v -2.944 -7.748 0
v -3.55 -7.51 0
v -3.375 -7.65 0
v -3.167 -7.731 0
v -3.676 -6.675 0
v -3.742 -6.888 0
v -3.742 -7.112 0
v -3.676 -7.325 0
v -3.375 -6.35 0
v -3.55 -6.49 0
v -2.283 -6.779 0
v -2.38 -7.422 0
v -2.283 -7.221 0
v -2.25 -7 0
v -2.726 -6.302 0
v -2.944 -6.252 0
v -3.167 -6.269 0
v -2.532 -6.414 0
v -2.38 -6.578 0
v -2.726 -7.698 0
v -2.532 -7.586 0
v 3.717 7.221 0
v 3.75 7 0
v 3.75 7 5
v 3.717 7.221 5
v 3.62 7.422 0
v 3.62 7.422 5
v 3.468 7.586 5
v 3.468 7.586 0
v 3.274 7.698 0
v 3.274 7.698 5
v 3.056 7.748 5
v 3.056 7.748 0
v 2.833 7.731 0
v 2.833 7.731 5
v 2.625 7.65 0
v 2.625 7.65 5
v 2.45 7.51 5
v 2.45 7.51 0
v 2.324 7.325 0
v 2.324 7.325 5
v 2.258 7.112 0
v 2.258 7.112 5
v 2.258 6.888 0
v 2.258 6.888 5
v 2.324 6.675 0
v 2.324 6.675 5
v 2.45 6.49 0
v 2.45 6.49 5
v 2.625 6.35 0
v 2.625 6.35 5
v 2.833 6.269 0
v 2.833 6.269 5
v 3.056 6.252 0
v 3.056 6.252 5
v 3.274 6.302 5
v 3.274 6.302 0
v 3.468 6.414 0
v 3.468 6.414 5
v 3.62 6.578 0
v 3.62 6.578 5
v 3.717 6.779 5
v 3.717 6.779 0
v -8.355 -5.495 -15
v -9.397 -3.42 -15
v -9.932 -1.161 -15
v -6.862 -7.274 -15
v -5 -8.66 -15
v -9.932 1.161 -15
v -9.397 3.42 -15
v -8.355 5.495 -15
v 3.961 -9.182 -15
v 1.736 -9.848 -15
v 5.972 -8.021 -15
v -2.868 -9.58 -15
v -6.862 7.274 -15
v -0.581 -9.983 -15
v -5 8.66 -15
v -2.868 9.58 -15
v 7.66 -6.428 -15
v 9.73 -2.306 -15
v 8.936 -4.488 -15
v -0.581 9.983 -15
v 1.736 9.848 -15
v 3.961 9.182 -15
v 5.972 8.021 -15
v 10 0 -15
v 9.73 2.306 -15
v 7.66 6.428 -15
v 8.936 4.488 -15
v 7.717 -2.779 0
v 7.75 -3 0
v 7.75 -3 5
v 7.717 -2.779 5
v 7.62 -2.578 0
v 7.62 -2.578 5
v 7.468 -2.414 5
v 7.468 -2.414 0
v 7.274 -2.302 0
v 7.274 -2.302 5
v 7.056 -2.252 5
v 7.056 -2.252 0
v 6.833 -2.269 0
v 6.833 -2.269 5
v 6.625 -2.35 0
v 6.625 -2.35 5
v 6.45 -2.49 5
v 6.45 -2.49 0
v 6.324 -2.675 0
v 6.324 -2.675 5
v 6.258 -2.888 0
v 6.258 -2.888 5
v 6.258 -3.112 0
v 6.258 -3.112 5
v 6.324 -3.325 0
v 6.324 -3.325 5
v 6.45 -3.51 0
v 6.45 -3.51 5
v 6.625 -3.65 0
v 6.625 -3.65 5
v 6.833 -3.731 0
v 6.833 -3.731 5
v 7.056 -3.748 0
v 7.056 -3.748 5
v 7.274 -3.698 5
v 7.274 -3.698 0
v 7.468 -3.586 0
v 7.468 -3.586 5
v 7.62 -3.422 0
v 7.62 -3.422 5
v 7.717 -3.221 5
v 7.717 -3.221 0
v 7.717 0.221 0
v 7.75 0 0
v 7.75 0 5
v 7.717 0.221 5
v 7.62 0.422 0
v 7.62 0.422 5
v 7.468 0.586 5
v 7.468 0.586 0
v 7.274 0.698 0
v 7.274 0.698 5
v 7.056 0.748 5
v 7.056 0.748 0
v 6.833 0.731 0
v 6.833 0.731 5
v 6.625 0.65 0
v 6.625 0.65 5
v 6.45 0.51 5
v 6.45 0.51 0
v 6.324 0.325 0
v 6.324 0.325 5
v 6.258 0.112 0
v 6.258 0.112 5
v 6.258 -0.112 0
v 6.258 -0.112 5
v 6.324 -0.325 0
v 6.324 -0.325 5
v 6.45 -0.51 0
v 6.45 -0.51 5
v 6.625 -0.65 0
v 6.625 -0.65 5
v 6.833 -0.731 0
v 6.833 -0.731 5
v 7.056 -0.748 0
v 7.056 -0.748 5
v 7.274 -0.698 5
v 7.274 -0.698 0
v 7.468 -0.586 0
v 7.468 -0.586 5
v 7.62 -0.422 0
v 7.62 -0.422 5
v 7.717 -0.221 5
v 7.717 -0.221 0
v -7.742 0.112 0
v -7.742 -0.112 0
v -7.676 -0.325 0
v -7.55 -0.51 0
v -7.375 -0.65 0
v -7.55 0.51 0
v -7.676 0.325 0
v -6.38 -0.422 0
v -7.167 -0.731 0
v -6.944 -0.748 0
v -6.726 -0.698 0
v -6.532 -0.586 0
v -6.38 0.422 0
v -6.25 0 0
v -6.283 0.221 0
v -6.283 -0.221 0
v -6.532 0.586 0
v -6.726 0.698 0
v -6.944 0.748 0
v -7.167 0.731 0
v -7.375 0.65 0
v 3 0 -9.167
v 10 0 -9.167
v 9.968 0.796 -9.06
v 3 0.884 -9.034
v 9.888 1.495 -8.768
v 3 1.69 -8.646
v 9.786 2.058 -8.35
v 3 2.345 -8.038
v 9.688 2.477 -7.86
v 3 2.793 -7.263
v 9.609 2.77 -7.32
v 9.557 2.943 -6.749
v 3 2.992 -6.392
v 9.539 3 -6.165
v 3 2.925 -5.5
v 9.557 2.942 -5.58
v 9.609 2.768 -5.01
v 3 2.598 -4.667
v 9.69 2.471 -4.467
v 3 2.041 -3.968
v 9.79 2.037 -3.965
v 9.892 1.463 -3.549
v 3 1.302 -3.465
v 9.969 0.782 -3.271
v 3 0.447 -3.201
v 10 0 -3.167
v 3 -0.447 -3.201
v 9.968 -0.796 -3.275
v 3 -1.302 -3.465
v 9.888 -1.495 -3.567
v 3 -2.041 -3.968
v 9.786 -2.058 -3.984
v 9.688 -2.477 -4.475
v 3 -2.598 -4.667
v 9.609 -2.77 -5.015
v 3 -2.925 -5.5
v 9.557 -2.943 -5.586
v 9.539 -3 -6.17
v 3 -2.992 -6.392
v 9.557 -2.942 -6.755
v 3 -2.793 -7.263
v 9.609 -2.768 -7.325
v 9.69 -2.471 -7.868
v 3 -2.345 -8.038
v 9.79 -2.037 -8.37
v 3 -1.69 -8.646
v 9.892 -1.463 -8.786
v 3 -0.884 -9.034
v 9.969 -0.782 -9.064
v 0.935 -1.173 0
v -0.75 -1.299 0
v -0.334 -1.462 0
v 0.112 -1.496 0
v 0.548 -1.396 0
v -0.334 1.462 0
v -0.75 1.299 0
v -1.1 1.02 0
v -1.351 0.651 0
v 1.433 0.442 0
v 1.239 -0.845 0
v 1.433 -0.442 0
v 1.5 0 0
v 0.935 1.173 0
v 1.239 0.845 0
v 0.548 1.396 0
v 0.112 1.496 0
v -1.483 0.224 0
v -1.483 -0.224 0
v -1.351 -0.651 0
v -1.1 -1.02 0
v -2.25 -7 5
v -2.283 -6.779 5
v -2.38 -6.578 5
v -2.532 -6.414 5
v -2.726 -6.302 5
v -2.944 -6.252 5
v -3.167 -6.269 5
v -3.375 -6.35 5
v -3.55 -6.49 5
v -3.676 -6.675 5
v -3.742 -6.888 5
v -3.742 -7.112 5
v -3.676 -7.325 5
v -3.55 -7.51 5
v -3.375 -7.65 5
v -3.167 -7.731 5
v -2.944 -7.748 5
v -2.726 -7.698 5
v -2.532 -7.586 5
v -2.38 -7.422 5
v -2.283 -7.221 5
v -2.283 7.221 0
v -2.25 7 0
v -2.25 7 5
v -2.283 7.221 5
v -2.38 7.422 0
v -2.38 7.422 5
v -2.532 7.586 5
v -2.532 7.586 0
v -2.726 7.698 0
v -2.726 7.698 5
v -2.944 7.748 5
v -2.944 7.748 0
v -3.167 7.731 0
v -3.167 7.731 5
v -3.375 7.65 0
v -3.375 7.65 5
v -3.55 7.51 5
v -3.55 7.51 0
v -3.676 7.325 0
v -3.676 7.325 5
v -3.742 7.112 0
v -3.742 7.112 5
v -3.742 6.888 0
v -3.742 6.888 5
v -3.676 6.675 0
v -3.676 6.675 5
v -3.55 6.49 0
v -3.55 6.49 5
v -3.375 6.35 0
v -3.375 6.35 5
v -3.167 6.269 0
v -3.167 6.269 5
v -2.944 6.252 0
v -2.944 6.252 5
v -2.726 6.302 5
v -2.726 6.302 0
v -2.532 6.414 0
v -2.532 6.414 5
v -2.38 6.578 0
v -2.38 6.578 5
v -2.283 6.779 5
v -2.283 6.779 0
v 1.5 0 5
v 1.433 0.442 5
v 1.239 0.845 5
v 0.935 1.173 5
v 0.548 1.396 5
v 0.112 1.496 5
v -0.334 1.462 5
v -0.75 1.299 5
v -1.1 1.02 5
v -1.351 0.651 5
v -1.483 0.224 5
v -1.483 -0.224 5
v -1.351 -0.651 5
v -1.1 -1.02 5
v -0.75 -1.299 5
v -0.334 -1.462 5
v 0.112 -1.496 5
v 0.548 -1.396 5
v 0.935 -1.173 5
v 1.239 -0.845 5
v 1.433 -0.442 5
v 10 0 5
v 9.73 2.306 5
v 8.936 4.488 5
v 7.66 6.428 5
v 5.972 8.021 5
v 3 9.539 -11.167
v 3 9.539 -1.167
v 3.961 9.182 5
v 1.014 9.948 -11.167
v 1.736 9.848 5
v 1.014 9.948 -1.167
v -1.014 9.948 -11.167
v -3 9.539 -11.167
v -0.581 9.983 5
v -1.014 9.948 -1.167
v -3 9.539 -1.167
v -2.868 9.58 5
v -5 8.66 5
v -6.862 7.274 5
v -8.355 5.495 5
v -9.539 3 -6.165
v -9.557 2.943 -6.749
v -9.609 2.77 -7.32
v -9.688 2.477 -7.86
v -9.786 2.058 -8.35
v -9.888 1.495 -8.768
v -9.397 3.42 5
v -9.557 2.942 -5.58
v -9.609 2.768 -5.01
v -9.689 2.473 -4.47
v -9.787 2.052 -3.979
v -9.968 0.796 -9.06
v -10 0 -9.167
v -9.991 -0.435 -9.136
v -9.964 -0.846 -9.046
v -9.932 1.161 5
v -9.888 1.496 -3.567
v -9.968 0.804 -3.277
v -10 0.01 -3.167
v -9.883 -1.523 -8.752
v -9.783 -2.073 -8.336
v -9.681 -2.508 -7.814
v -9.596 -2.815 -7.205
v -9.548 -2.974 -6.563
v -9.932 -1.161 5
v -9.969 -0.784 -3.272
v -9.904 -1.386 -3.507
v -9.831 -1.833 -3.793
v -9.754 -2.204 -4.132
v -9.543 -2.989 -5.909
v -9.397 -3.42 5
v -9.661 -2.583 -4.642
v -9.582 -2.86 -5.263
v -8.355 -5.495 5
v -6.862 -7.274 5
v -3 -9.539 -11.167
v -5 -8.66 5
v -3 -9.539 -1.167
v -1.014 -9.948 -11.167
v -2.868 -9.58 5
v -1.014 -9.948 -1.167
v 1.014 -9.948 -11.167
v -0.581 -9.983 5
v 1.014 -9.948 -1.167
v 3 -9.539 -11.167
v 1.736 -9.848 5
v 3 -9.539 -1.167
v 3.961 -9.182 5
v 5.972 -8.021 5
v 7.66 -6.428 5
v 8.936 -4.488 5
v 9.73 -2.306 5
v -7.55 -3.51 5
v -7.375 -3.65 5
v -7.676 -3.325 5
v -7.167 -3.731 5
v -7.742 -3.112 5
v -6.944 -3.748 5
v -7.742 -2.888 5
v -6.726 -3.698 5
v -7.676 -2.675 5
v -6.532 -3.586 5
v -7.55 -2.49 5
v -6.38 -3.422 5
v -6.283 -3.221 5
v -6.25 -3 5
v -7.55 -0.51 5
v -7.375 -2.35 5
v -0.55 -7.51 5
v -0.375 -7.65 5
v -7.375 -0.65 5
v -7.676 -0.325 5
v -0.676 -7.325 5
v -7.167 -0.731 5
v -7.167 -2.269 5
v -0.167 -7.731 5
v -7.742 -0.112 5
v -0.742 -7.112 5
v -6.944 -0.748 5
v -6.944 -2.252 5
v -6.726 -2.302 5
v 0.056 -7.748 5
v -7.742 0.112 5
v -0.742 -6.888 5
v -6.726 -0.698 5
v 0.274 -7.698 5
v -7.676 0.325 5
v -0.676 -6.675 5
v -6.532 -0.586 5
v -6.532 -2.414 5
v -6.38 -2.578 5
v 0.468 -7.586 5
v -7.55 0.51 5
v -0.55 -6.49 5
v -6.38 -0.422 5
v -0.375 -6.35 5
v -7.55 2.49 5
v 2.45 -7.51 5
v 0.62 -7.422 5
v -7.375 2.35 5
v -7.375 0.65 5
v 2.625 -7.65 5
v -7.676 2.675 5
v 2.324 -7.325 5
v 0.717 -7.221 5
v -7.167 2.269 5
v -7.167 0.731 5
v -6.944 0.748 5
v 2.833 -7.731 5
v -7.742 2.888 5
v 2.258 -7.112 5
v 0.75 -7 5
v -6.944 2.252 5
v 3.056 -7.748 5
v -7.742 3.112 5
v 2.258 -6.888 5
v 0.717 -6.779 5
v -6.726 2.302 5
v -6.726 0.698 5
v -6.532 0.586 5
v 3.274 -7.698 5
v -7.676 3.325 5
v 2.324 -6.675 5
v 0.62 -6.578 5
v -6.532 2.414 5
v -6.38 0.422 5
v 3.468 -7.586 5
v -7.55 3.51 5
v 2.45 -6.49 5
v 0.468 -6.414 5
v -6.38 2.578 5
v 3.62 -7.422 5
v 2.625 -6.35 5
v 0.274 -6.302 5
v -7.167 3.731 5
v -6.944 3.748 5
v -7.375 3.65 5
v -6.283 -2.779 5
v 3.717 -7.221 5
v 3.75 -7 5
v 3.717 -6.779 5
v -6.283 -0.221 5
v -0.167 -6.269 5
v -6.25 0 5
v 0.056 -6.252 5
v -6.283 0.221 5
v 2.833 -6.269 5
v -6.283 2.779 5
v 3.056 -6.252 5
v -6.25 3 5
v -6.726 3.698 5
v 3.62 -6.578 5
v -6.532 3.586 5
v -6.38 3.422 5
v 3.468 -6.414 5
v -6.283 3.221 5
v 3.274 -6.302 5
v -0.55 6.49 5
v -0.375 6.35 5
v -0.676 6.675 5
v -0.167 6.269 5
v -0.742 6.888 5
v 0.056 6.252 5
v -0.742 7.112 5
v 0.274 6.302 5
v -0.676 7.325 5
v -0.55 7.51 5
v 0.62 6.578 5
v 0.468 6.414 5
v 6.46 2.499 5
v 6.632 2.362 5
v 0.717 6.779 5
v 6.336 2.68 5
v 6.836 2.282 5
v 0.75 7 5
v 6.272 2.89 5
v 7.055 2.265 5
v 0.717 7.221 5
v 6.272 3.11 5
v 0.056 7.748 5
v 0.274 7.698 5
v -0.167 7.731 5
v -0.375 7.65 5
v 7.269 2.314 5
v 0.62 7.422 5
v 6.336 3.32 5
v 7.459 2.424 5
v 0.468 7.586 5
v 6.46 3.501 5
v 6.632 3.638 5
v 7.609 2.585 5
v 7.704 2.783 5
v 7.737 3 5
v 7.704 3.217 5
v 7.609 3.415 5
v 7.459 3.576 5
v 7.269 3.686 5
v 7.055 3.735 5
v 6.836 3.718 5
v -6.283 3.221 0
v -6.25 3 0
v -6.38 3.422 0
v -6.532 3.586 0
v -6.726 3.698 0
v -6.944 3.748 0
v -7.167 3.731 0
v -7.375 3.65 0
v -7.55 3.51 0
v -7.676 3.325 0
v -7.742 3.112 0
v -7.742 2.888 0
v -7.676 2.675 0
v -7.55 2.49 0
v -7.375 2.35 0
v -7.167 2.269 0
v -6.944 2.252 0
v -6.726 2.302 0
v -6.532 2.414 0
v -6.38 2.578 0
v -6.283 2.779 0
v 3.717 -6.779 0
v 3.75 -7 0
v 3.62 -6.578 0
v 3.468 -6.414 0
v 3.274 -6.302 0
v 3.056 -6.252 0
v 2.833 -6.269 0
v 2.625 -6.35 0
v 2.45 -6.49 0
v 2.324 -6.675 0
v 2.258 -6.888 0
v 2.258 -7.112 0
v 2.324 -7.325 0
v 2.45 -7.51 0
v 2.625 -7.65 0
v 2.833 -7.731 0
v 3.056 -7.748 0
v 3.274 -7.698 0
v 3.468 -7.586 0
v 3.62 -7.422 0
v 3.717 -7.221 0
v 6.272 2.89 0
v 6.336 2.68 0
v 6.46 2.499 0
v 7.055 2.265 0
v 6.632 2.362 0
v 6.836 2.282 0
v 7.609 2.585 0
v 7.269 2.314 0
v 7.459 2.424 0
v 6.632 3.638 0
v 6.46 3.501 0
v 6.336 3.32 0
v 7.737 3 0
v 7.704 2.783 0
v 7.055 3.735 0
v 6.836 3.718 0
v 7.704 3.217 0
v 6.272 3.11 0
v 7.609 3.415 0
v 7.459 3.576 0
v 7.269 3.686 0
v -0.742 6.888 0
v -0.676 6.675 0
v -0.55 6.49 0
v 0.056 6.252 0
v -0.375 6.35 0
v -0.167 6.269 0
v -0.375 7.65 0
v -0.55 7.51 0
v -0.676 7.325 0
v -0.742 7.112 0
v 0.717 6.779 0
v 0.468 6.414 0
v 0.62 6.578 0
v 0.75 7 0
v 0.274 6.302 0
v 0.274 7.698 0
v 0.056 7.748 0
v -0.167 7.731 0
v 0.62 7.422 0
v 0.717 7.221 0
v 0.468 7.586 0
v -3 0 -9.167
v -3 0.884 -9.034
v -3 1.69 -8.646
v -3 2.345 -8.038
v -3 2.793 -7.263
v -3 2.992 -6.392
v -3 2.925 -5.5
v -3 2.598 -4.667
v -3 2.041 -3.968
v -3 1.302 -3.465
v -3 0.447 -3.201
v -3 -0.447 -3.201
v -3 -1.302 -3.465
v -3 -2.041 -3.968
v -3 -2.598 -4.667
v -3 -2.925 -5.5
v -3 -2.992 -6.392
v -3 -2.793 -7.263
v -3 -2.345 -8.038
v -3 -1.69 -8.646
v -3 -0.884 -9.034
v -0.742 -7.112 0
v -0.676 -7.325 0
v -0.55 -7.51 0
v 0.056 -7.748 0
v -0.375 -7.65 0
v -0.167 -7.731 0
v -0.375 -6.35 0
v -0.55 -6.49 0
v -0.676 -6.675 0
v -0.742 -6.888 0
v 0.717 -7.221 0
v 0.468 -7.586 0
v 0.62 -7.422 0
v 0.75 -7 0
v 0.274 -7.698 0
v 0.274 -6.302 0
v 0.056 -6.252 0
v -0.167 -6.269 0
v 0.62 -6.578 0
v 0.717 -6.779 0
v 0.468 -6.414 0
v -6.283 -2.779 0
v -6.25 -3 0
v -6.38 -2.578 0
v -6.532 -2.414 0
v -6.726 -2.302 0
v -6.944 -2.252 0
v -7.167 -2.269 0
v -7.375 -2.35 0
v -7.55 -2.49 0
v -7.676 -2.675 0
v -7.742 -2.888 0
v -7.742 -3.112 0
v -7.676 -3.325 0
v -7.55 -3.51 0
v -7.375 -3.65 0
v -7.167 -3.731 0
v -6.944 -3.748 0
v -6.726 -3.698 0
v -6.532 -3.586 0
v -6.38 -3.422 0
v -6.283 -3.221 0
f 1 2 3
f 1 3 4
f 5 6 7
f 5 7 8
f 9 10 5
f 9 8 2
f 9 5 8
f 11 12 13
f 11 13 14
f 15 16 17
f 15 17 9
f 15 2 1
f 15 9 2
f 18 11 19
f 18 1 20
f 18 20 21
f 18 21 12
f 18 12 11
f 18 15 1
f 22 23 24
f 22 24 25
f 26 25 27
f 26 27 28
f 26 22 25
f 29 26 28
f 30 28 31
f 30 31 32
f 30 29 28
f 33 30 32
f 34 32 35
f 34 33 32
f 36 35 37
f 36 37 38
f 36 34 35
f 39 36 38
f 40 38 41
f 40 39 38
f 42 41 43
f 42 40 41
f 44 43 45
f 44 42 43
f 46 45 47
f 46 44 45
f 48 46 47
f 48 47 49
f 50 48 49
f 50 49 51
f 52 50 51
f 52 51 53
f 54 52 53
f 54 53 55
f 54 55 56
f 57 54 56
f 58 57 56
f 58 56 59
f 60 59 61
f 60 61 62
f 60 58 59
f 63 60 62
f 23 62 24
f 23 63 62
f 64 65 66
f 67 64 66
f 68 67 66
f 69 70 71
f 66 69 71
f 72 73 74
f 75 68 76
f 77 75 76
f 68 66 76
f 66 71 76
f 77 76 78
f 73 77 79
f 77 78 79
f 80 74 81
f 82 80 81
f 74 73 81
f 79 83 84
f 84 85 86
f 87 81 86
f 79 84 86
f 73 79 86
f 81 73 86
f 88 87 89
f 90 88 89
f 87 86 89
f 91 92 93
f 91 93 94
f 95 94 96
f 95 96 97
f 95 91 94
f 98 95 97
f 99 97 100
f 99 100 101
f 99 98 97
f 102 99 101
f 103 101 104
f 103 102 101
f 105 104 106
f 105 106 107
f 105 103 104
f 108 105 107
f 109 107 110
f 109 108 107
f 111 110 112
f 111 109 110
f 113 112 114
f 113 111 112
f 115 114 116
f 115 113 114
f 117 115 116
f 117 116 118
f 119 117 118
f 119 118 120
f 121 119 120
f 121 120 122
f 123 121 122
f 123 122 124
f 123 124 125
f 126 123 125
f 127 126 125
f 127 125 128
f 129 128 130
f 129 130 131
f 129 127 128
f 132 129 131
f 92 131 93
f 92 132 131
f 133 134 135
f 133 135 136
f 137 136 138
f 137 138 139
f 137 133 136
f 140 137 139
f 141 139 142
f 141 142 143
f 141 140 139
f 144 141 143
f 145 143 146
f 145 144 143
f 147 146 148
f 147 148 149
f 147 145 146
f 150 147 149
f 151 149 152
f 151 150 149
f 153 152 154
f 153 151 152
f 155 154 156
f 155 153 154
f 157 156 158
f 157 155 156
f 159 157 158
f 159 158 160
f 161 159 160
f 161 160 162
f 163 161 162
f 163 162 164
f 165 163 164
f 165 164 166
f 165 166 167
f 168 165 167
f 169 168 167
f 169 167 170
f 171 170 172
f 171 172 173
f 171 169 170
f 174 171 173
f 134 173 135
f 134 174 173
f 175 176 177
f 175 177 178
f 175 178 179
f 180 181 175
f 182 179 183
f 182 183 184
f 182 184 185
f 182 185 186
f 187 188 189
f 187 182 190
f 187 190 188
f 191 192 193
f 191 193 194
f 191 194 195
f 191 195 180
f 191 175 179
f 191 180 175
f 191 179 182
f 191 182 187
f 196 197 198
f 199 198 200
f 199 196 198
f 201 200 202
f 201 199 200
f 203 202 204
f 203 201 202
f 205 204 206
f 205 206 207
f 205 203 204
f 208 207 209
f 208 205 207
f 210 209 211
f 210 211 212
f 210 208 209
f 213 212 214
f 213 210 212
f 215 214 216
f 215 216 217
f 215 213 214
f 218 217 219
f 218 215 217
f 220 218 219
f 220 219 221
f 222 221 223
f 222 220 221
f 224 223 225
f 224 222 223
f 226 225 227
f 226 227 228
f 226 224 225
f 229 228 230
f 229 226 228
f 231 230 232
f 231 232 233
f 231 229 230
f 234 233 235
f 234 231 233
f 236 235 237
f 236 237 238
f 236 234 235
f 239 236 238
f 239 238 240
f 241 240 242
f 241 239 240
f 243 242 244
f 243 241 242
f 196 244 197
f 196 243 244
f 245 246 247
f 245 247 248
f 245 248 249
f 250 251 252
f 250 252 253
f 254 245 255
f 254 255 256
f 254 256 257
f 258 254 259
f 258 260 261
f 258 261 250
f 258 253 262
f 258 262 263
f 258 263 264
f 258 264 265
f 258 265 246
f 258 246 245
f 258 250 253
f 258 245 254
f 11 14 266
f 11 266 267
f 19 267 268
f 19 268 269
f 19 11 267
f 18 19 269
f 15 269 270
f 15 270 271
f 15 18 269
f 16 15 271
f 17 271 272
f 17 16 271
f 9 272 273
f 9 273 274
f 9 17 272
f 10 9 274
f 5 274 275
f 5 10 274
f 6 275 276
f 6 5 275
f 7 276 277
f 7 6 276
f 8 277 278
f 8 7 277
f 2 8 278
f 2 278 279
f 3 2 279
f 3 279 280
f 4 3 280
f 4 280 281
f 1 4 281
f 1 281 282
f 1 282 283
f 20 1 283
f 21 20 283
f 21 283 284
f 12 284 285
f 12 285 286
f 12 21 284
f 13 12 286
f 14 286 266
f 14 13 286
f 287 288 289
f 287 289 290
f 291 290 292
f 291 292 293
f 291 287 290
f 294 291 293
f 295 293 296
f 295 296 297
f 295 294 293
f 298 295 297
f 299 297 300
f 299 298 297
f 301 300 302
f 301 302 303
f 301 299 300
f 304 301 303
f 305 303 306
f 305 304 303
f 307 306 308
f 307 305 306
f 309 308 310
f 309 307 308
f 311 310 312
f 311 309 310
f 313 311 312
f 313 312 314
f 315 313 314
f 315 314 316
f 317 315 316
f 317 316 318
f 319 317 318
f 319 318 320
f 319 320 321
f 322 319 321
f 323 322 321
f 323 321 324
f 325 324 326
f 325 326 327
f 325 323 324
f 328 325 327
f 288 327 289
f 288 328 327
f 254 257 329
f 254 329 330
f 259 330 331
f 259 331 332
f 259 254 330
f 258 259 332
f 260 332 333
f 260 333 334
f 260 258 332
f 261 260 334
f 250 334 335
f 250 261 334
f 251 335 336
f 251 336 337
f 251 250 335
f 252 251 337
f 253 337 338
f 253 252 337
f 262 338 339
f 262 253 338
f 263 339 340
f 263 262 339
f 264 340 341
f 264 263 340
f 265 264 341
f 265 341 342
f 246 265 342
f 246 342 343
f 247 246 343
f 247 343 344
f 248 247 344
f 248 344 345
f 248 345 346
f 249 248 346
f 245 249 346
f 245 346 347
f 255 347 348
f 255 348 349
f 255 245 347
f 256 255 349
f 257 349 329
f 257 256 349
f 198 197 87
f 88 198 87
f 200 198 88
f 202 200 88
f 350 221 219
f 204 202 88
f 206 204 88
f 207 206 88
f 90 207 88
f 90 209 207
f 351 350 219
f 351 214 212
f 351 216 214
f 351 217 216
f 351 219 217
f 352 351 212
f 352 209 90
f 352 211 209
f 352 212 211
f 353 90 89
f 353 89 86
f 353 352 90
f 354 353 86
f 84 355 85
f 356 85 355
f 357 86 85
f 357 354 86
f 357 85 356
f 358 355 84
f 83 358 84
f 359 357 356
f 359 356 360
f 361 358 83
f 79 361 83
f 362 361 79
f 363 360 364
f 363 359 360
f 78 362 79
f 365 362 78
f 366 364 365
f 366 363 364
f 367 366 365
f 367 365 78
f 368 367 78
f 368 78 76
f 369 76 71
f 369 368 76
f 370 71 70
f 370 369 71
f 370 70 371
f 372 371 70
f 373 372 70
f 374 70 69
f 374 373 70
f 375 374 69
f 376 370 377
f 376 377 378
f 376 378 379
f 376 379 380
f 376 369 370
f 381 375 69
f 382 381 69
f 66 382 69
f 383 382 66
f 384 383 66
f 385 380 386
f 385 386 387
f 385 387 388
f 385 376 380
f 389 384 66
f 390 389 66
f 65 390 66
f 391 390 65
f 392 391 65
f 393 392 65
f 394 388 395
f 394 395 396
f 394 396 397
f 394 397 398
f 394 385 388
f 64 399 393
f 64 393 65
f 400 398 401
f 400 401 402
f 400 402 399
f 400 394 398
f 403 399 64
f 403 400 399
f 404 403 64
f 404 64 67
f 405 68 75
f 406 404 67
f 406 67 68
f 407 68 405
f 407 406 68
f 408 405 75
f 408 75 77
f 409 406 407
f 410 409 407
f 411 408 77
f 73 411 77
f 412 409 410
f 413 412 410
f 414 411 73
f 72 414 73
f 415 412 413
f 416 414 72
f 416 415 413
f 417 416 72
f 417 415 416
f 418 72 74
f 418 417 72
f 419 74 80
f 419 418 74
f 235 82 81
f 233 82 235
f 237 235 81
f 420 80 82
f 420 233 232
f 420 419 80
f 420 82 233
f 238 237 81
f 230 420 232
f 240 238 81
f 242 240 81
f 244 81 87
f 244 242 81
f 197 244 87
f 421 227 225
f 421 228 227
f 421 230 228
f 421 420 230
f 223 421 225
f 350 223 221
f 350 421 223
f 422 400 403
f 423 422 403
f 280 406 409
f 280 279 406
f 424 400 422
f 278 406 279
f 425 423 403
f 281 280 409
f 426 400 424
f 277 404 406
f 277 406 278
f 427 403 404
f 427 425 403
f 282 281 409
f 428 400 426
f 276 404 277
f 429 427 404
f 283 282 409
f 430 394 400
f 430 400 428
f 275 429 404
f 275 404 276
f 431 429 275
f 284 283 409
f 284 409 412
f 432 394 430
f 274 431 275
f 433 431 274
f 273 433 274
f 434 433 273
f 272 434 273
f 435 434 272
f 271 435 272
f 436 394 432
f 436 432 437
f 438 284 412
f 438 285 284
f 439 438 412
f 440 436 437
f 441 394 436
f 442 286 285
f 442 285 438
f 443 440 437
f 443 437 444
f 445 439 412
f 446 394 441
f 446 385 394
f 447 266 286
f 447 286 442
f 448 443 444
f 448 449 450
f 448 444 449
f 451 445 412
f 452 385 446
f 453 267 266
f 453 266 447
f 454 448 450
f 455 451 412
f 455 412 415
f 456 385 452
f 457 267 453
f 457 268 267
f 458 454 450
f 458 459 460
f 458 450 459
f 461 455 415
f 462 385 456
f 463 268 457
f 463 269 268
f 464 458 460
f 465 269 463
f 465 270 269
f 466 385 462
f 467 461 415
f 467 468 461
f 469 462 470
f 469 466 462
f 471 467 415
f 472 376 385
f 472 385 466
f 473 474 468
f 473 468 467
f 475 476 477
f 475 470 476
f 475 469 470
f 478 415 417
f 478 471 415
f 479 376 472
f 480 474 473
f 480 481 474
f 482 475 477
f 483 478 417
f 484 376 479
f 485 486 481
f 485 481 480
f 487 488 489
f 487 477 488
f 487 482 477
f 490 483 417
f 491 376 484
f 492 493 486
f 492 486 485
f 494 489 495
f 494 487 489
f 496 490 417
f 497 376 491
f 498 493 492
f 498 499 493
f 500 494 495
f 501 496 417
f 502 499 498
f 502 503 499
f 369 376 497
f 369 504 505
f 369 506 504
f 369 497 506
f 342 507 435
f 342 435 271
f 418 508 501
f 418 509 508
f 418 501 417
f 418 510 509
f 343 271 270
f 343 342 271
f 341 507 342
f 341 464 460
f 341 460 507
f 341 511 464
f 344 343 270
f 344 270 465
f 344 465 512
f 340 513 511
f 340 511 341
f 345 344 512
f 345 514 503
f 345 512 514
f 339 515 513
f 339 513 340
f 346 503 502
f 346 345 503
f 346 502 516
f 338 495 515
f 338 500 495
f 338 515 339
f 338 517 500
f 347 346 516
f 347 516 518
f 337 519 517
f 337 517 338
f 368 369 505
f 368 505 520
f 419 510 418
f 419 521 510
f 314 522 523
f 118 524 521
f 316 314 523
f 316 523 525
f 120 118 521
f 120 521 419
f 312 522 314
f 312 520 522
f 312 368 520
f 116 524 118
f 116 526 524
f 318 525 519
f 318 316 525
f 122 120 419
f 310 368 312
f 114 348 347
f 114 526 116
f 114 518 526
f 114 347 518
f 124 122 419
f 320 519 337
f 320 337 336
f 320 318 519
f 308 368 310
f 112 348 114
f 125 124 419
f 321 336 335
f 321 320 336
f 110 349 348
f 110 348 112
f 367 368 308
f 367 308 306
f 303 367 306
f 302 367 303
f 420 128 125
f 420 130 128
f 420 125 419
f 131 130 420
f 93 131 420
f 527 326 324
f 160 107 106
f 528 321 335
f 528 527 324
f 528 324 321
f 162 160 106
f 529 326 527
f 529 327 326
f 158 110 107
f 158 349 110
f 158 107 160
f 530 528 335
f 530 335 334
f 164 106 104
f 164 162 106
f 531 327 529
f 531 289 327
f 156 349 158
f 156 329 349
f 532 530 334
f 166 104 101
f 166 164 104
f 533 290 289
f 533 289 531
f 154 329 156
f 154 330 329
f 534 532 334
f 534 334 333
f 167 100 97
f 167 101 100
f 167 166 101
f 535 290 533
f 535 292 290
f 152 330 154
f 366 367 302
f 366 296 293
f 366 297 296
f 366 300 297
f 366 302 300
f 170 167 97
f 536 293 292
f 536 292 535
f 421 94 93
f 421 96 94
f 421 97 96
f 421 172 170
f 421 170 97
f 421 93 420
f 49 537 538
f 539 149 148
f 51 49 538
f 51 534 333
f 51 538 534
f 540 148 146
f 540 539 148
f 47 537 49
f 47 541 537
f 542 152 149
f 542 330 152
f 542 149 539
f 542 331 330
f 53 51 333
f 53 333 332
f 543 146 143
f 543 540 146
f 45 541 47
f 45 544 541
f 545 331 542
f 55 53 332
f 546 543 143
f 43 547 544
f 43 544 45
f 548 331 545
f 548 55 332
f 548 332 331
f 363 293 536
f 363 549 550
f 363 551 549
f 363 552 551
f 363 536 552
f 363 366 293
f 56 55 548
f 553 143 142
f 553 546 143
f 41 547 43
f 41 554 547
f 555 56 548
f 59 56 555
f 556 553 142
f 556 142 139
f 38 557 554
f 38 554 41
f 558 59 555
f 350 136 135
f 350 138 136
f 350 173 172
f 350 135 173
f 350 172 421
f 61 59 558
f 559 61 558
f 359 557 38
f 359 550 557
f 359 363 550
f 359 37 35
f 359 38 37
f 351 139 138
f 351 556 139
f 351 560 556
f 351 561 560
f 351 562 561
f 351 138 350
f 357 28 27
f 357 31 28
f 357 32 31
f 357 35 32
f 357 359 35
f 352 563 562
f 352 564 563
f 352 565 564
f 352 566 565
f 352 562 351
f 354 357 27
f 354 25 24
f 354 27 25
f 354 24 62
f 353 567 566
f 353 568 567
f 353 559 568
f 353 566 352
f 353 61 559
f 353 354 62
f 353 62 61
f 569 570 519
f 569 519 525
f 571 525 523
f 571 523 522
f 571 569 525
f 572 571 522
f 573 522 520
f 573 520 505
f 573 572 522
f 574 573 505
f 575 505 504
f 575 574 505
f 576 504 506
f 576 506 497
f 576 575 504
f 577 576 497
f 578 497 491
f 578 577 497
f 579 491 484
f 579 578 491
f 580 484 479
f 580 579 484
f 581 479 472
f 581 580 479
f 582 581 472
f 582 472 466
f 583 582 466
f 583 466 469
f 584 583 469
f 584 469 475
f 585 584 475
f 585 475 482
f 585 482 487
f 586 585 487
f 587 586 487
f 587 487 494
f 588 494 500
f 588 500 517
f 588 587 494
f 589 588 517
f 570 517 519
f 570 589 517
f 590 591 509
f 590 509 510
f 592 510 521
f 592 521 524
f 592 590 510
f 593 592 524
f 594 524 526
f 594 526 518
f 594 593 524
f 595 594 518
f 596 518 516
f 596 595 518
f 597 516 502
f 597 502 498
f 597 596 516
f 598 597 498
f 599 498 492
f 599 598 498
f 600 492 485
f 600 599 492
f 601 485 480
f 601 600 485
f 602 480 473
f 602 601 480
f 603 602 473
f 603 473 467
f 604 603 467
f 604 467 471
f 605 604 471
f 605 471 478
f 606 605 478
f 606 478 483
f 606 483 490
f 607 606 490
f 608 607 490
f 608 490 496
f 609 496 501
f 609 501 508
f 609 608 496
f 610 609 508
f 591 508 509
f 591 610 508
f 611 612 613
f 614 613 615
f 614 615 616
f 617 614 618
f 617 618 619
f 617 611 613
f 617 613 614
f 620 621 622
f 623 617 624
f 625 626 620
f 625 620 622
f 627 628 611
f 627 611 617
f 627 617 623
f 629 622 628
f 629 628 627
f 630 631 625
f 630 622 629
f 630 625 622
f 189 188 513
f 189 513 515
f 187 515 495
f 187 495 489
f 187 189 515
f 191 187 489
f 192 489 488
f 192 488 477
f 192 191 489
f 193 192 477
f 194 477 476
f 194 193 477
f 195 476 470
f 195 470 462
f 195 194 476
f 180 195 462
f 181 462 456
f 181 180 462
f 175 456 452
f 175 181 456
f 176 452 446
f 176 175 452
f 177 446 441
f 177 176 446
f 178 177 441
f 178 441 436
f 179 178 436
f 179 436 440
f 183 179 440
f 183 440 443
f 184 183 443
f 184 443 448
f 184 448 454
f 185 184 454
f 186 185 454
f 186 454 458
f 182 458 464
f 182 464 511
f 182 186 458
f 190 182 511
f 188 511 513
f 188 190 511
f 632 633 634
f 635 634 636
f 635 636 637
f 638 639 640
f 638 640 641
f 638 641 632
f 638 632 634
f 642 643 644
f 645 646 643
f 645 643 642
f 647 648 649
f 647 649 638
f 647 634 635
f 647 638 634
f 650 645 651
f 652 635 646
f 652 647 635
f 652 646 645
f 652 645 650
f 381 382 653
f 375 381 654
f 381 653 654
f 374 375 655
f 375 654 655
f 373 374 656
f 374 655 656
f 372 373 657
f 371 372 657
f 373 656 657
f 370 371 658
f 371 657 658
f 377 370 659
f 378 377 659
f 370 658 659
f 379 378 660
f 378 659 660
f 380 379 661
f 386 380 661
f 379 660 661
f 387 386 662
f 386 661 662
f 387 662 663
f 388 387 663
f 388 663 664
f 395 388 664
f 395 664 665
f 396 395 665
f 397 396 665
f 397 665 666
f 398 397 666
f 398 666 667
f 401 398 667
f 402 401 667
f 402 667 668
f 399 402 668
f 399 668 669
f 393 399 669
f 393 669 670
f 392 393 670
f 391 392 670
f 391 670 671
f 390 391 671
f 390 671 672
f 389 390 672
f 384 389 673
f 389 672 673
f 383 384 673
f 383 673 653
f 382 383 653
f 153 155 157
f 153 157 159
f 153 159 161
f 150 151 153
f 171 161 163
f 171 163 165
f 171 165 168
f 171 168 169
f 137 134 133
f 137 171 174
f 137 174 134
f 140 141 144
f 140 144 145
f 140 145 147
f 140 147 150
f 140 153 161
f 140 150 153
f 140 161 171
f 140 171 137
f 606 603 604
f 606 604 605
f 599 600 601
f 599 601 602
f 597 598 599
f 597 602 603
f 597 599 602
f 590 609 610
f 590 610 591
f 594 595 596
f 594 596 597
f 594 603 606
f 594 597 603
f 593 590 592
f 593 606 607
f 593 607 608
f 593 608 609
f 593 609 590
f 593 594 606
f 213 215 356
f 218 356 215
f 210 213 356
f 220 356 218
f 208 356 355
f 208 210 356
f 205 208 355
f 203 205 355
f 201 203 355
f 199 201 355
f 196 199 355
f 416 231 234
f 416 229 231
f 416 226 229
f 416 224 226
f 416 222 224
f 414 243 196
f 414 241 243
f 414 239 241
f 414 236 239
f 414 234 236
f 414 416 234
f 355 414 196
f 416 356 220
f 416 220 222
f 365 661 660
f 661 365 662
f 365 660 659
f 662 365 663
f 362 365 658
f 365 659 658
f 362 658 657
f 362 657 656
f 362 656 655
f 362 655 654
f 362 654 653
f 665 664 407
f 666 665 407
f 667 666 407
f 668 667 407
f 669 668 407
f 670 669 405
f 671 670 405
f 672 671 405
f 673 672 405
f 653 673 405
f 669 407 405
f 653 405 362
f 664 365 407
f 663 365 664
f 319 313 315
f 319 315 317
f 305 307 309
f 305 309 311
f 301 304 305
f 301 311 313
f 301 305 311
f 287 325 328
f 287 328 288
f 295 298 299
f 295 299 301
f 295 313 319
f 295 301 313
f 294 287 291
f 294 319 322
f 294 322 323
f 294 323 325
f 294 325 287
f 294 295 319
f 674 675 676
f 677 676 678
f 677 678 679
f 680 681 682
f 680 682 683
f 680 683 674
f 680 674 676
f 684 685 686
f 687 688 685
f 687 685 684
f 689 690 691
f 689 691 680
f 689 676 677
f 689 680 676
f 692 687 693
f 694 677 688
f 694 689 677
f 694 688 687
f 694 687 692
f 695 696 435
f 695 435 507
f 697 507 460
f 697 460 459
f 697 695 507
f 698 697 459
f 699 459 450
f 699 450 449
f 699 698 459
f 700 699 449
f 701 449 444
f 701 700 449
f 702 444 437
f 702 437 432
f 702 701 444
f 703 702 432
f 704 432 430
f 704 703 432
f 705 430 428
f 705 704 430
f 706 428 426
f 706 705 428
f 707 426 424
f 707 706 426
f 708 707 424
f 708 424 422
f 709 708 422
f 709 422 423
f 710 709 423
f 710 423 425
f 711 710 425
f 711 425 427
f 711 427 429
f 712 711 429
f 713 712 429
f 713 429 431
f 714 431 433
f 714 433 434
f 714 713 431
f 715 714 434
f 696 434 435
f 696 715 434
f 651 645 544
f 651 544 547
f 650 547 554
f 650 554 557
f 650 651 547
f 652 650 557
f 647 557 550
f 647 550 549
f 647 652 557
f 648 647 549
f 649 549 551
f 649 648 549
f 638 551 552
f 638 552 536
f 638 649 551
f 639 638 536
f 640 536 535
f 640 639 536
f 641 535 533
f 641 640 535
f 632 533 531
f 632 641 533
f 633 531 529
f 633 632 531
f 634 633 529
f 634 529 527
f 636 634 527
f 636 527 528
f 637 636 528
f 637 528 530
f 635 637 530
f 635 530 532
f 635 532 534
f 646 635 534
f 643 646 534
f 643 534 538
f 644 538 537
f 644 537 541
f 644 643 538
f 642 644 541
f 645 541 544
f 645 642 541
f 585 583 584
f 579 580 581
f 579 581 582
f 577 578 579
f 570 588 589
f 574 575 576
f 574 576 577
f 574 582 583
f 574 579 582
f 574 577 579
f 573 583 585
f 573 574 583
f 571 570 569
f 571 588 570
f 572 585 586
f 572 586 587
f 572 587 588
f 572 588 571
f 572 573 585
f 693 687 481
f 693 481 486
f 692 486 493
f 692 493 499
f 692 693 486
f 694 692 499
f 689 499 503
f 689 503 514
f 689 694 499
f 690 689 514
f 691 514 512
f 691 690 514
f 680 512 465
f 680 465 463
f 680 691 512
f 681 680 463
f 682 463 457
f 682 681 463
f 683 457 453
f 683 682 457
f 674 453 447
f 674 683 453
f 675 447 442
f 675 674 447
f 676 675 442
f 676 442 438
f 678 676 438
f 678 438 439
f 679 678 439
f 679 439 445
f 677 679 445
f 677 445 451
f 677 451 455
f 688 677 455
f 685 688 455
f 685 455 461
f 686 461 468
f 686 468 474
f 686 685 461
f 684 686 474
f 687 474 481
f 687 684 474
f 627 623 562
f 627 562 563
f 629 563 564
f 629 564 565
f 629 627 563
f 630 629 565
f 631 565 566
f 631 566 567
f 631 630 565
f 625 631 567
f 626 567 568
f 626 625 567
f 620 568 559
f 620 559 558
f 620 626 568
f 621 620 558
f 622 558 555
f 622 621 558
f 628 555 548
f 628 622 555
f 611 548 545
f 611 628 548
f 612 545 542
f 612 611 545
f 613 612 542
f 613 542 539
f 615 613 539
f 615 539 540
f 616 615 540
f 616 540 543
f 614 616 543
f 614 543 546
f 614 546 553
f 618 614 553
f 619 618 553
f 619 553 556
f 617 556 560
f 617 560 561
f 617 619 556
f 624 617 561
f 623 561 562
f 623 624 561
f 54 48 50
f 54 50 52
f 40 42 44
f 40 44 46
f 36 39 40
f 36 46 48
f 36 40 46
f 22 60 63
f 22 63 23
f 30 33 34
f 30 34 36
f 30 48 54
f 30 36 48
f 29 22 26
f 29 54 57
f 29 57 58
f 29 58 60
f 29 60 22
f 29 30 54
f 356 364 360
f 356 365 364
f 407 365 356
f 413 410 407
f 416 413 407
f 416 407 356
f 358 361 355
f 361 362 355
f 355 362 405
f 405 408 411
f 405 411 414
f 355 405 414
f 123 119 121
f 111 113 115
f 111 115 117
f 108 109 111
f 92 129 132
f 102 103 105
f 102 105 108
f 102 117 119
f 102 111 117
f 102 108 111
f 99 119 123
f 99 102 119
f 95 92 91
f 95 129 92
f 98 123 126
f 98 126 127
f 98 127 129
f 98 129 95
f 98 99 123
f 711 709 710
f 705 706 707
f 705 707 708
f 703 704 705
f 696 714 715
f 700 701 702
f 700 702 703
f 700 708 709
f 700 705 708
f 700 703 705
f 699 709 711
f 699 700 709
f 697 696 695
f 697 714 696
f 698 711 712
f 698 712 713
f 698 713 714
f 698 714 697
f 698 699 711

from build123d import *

# Parameters (mm, degrees)
SKETCH2_R               = 10
SKETCH2_R_2             = 1.5
SKETCH2_R_3             = 0.736643129
SKETCH2_R_4             = 0.75
BOSS_EXTRUDE1_DEPTH     = 5
BOSS_EXTRUDE2_START     = -15
SKETCH3_R               = 10
BOSS_EXTRUDE2_DEPTH     = 15
CUT_EXTRUDE1_DEPTH      = 20
CUT_EXTRUDE1_DEPTH_BACK = 20
SKETCH4_W               = 6
SKETCH4_H               = 10
CUT_EXTRUDE2_DEPTH      = 20
CUT_EXTRUDE2_DEPTH_BACK = 20
SKETCH5_R               = 3


with BuildPart() as part:
    # Sketch2 → Boss-Extrude1 (new body)
    with BuildSketch(Plane.XY):
        Circle(SKETCH2_R)
        Circle(SKETCH2_R_2, mode=Mode.SUBTRACT)
        with Locations((7, 3)):
            Circle(SKETCH2_R_3, mode=Mode.SUBTRACT)
        with Locations((7, 0)):
            Circle(SKETCH2_R_4, mode=Mode.SUBTRACT)
        with Locations((7, -3)):
            Circle(SKETCH2_R_4, mode=Mode.SUBTRACT)
        with Locations((3, -7)):
            Circle(SKETCH2_R_4, mode=Mode.SUBTRACT)
        with Locations((0, -7)):
            Circle(SKETCH2_R_4, mode=Mode.SUBTRACT)
        with Locations((-3, -7)):
            Circle(SKETCH2_R_4, mode=Mode.SUBTRACT)
        with Locations((-7, -3)):
            Circle(SKETCH2_R_4, mode=Mode.SUBTRACT)
        with Locations((-7, 0)):
            Circle(SKETCH2_R_4, mode=Mode.SUBTRACT)
        with Locations((-7, 3)):
            Circle(SKETCH2_R_4, mode=Mode.SUBTRACT)
        with Locations((-3, 7)):
            Circle(SKETCH2_R_4, mode=Mode.SUBTRACT)
        with Locations((0, 7)):
            Circle(SKETCH2_R_4, mode=Mode.SUBTRACT)
        with Locations((3, 7)):
            Circle(SKETCH2_R_4, mode=Mode.SUBTRACT)
    extrude(amount=BOSS_EXTRUDE1_DEPTH)

    # Sketch3 → Boss-Extrude2 (add)
    with BuildSketch(Plane.XY.offset(BOSS_EXTRUDE2_START)):
        Circle(SKETCH3_R)
    extrude(amount=BOSS_EXTRUDE2_DEPTH)

    # Sketch4 → Cut-Extrude1 (cut, two sides: drawn at the far end of the back side and taken through both)
    with BuildSketch(Plane(origin=(0, 0, 0), x_dir=(1, 0, 0), z_dir=(0, 1, 0)).offset(-CUT_EXTRUDE1_DEPTH_BACK)):
        with Locations((0, 6.167476411)):
            Rectangle(SKETCH4_W, SKETCH4_H)
    extrude(amount=CUT_EXTRUDE1_DEPTH + CUT_EXTRUDE1_DEPTH_BACK, mode=Mode.SUBTRACT)

    # Sketch5 → Cut-Extrude2 (cut, two sides: drawn at the far end of the back side and taken through both)
    with BuildSketch(Plane(origin=(0, 0, 0), x_dir=(0, 0, -1), z_dir=(1, 0, 0)).offset(-CUT_EXTRUDE2_DEPTH_BACK)):
        with Locations((6.167476411, 0)):
            Circle(SKETCH5_R)
    extrude(amount=CUT_EXTRUDE2_DEPTH + CUT_EXTRUDE2_DEPTH_BACK, mode=Mode.SUBTRACT)


solid = part.part
